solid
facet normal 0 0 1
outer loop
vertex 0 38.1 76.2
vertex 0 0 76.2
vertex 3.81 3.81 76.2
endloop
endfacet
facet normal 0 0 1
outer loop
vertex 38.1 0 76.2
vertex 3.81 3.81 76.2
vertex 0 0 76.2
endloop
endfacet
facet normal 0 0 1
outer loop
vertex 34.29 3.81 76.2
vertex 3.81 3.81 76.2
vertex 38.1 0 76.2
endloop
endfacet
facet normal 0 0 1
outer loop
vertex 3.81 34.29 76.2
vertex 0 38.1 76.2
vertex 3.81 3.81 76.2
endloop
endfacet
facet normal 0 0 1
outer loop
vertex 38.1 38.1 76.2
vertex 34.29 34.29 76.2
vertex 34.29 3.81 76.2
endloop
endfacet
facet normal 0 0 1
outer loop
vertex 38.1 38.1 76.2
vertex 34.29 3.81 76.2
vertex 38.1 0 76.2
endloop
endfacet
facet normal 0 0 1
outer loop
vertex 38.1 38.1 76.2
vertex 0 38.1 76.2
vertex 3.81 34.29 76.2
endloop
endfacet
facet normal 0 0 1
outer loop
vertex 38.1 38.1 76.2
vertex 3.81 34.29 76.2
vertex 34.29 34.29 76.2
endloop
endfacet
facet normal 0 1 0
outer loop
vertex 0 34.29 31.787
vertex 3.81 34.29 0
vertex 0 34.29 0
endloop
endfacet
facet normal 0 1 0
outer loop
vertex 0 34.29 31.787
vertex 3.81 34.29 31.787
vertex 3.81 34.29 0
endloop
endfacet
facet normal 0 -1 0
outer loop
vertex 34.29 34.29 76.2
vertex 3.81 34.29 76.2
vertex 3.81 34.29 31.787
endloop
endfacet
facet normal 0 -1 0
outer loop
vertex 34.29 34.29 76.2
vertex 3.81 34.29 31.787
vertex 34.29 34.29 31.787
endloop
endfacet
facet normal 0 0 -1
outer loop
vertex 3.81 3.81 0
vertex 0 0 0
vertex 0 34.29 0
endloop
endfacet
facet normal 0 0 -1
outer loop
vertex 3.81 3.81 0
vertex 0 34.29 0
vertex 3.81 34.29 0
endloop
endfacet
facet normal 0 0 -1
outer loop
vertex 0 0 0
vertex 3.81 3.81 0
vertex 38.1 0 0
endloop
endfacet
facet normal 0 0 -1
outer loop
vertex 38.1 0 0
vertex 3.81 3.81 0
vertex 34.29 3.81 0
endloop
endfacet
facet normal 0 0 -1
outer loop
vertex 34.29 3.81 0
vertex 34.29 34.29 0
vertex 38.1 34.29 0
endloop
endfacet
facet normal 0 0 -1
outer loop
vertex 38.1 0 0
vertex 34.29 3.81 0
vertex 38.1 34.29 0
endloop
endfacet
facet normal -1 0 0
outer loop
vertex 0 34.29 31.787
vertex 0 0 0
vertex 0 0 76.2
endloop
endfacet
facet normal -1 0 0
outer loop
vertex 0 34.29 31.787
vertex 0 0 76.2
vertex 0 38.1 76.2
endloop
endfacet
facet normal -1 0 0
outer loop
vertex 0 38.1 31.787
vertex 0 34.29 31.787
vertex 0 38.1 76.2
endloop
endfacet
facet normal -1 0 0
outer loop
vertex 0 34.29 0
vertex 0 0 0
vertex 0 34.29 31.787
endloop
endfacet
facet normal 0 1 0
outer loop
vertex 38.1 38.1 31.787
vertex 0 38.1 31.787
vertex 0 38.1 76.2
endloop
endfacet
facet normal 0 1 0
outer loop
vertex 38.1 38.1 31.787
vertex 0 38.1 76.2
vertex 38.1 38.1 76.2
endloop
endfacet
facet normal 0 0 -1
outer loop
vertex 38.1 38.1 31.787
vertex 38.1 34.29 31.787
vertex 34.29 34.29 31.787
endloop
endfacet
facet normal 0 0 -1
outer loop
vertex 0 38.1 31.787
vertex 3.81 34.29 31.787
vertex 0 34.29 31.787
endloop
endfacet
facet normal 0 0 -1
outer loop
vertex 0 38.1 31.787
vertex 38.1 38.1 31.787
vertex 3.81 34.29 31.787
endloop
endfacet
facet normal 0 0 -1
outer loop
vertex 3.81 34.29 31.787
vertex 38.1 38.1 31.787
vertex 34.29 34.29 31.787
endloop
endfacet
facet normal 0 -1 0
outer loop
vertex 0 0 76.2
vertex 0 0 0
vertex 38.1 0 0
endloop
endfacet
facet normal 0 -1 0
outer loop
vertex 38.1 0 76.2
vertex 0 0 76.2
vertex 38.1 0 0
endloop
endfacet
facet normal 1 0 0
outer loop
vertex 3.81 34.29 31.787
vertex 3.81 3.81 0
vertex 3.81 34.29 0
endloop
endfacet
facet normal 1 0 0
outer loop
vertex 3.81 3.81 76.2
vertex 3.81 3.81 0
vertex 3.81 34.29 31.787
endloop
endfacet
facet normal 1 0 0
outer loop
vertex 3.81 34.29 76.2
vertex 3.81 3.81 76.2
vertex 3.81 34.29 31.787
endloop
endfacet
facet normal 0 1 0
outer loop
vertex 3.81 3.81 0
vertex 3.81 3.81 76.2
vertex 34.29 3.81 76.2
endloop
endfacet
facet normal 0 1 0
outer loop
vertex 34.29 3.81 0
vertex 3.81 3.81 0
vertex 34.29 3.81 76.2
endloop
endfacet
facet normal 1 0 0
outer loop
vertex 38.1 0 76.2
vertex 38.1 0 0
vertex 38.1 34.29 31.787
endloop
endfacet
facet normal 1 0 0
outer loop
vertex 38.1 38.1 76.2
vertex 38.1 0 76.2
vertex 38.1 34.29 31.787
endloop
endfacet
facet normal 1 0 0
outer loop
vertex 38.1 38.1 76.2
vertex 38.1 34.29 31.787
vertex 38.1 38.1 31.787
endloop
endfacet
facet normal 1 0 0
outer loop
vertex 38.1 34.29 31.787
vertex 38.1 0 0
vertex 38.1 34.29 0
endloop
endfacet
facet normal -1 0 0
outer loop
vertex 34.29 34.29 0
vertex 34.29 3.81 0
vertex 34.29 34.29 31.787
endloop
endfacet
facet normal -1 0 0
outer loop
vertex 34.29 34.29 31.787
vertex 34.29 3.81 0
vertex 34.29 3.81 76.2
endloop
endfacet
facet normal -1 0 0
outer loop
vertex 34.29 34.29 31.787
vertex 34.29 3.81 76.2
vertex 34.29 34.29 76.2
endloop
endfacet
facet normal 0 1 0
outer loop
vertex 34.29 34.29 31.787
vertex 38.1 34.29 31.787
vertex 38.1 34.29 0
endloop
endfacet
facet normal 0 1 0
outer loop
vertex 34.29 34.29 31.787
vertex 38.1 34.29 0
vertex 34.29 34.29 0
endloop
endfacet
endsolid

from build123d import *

# Parameters (mm, degrees)
F0_W     = 38.1
F0_H     = 38.1
F1_DEPTH = 76.2
F2_W     = 30.480002
F2_H     = 30.480002
F3_DEPTH = 88.9
F4_W     = 38.1
F4_H     = 31.786919
F5_DEPTH = 3.81


with BuildPart() as f1:
    # F0 (on Top) → F1 (new body)
    with BuildSketch(Plane.XY):
        with Locations((19.05, 19.05)):
            Rectangle(F0_W, F0_H)
    extrude(amount=F1_DEPTH)

    # F2 (on face) → F3 (cut)
    with BuildSketch(Plane.XY.offset(76.2)):
        with Locations((19.05, 19.05)):
            Rectangle(F2_W, F2_H)
    extrude(amount=-F3_DEPTH, mode=Mode.SUBTRACT)

    # F4 (on face) → F5 (cut)
    with BuildSketch(Plane(origin=(0, 38.1, 0), x_dir=(-1, 0, 0), z_dir=(0, 1, 0))):
        with Locations((-19.05, 15.893459)):
            Rectangle(F4_W, F4_H)
    extrude(amount=-F5_DEPTH, mode=Mode.SUBTRACT)


solid = f1.part
